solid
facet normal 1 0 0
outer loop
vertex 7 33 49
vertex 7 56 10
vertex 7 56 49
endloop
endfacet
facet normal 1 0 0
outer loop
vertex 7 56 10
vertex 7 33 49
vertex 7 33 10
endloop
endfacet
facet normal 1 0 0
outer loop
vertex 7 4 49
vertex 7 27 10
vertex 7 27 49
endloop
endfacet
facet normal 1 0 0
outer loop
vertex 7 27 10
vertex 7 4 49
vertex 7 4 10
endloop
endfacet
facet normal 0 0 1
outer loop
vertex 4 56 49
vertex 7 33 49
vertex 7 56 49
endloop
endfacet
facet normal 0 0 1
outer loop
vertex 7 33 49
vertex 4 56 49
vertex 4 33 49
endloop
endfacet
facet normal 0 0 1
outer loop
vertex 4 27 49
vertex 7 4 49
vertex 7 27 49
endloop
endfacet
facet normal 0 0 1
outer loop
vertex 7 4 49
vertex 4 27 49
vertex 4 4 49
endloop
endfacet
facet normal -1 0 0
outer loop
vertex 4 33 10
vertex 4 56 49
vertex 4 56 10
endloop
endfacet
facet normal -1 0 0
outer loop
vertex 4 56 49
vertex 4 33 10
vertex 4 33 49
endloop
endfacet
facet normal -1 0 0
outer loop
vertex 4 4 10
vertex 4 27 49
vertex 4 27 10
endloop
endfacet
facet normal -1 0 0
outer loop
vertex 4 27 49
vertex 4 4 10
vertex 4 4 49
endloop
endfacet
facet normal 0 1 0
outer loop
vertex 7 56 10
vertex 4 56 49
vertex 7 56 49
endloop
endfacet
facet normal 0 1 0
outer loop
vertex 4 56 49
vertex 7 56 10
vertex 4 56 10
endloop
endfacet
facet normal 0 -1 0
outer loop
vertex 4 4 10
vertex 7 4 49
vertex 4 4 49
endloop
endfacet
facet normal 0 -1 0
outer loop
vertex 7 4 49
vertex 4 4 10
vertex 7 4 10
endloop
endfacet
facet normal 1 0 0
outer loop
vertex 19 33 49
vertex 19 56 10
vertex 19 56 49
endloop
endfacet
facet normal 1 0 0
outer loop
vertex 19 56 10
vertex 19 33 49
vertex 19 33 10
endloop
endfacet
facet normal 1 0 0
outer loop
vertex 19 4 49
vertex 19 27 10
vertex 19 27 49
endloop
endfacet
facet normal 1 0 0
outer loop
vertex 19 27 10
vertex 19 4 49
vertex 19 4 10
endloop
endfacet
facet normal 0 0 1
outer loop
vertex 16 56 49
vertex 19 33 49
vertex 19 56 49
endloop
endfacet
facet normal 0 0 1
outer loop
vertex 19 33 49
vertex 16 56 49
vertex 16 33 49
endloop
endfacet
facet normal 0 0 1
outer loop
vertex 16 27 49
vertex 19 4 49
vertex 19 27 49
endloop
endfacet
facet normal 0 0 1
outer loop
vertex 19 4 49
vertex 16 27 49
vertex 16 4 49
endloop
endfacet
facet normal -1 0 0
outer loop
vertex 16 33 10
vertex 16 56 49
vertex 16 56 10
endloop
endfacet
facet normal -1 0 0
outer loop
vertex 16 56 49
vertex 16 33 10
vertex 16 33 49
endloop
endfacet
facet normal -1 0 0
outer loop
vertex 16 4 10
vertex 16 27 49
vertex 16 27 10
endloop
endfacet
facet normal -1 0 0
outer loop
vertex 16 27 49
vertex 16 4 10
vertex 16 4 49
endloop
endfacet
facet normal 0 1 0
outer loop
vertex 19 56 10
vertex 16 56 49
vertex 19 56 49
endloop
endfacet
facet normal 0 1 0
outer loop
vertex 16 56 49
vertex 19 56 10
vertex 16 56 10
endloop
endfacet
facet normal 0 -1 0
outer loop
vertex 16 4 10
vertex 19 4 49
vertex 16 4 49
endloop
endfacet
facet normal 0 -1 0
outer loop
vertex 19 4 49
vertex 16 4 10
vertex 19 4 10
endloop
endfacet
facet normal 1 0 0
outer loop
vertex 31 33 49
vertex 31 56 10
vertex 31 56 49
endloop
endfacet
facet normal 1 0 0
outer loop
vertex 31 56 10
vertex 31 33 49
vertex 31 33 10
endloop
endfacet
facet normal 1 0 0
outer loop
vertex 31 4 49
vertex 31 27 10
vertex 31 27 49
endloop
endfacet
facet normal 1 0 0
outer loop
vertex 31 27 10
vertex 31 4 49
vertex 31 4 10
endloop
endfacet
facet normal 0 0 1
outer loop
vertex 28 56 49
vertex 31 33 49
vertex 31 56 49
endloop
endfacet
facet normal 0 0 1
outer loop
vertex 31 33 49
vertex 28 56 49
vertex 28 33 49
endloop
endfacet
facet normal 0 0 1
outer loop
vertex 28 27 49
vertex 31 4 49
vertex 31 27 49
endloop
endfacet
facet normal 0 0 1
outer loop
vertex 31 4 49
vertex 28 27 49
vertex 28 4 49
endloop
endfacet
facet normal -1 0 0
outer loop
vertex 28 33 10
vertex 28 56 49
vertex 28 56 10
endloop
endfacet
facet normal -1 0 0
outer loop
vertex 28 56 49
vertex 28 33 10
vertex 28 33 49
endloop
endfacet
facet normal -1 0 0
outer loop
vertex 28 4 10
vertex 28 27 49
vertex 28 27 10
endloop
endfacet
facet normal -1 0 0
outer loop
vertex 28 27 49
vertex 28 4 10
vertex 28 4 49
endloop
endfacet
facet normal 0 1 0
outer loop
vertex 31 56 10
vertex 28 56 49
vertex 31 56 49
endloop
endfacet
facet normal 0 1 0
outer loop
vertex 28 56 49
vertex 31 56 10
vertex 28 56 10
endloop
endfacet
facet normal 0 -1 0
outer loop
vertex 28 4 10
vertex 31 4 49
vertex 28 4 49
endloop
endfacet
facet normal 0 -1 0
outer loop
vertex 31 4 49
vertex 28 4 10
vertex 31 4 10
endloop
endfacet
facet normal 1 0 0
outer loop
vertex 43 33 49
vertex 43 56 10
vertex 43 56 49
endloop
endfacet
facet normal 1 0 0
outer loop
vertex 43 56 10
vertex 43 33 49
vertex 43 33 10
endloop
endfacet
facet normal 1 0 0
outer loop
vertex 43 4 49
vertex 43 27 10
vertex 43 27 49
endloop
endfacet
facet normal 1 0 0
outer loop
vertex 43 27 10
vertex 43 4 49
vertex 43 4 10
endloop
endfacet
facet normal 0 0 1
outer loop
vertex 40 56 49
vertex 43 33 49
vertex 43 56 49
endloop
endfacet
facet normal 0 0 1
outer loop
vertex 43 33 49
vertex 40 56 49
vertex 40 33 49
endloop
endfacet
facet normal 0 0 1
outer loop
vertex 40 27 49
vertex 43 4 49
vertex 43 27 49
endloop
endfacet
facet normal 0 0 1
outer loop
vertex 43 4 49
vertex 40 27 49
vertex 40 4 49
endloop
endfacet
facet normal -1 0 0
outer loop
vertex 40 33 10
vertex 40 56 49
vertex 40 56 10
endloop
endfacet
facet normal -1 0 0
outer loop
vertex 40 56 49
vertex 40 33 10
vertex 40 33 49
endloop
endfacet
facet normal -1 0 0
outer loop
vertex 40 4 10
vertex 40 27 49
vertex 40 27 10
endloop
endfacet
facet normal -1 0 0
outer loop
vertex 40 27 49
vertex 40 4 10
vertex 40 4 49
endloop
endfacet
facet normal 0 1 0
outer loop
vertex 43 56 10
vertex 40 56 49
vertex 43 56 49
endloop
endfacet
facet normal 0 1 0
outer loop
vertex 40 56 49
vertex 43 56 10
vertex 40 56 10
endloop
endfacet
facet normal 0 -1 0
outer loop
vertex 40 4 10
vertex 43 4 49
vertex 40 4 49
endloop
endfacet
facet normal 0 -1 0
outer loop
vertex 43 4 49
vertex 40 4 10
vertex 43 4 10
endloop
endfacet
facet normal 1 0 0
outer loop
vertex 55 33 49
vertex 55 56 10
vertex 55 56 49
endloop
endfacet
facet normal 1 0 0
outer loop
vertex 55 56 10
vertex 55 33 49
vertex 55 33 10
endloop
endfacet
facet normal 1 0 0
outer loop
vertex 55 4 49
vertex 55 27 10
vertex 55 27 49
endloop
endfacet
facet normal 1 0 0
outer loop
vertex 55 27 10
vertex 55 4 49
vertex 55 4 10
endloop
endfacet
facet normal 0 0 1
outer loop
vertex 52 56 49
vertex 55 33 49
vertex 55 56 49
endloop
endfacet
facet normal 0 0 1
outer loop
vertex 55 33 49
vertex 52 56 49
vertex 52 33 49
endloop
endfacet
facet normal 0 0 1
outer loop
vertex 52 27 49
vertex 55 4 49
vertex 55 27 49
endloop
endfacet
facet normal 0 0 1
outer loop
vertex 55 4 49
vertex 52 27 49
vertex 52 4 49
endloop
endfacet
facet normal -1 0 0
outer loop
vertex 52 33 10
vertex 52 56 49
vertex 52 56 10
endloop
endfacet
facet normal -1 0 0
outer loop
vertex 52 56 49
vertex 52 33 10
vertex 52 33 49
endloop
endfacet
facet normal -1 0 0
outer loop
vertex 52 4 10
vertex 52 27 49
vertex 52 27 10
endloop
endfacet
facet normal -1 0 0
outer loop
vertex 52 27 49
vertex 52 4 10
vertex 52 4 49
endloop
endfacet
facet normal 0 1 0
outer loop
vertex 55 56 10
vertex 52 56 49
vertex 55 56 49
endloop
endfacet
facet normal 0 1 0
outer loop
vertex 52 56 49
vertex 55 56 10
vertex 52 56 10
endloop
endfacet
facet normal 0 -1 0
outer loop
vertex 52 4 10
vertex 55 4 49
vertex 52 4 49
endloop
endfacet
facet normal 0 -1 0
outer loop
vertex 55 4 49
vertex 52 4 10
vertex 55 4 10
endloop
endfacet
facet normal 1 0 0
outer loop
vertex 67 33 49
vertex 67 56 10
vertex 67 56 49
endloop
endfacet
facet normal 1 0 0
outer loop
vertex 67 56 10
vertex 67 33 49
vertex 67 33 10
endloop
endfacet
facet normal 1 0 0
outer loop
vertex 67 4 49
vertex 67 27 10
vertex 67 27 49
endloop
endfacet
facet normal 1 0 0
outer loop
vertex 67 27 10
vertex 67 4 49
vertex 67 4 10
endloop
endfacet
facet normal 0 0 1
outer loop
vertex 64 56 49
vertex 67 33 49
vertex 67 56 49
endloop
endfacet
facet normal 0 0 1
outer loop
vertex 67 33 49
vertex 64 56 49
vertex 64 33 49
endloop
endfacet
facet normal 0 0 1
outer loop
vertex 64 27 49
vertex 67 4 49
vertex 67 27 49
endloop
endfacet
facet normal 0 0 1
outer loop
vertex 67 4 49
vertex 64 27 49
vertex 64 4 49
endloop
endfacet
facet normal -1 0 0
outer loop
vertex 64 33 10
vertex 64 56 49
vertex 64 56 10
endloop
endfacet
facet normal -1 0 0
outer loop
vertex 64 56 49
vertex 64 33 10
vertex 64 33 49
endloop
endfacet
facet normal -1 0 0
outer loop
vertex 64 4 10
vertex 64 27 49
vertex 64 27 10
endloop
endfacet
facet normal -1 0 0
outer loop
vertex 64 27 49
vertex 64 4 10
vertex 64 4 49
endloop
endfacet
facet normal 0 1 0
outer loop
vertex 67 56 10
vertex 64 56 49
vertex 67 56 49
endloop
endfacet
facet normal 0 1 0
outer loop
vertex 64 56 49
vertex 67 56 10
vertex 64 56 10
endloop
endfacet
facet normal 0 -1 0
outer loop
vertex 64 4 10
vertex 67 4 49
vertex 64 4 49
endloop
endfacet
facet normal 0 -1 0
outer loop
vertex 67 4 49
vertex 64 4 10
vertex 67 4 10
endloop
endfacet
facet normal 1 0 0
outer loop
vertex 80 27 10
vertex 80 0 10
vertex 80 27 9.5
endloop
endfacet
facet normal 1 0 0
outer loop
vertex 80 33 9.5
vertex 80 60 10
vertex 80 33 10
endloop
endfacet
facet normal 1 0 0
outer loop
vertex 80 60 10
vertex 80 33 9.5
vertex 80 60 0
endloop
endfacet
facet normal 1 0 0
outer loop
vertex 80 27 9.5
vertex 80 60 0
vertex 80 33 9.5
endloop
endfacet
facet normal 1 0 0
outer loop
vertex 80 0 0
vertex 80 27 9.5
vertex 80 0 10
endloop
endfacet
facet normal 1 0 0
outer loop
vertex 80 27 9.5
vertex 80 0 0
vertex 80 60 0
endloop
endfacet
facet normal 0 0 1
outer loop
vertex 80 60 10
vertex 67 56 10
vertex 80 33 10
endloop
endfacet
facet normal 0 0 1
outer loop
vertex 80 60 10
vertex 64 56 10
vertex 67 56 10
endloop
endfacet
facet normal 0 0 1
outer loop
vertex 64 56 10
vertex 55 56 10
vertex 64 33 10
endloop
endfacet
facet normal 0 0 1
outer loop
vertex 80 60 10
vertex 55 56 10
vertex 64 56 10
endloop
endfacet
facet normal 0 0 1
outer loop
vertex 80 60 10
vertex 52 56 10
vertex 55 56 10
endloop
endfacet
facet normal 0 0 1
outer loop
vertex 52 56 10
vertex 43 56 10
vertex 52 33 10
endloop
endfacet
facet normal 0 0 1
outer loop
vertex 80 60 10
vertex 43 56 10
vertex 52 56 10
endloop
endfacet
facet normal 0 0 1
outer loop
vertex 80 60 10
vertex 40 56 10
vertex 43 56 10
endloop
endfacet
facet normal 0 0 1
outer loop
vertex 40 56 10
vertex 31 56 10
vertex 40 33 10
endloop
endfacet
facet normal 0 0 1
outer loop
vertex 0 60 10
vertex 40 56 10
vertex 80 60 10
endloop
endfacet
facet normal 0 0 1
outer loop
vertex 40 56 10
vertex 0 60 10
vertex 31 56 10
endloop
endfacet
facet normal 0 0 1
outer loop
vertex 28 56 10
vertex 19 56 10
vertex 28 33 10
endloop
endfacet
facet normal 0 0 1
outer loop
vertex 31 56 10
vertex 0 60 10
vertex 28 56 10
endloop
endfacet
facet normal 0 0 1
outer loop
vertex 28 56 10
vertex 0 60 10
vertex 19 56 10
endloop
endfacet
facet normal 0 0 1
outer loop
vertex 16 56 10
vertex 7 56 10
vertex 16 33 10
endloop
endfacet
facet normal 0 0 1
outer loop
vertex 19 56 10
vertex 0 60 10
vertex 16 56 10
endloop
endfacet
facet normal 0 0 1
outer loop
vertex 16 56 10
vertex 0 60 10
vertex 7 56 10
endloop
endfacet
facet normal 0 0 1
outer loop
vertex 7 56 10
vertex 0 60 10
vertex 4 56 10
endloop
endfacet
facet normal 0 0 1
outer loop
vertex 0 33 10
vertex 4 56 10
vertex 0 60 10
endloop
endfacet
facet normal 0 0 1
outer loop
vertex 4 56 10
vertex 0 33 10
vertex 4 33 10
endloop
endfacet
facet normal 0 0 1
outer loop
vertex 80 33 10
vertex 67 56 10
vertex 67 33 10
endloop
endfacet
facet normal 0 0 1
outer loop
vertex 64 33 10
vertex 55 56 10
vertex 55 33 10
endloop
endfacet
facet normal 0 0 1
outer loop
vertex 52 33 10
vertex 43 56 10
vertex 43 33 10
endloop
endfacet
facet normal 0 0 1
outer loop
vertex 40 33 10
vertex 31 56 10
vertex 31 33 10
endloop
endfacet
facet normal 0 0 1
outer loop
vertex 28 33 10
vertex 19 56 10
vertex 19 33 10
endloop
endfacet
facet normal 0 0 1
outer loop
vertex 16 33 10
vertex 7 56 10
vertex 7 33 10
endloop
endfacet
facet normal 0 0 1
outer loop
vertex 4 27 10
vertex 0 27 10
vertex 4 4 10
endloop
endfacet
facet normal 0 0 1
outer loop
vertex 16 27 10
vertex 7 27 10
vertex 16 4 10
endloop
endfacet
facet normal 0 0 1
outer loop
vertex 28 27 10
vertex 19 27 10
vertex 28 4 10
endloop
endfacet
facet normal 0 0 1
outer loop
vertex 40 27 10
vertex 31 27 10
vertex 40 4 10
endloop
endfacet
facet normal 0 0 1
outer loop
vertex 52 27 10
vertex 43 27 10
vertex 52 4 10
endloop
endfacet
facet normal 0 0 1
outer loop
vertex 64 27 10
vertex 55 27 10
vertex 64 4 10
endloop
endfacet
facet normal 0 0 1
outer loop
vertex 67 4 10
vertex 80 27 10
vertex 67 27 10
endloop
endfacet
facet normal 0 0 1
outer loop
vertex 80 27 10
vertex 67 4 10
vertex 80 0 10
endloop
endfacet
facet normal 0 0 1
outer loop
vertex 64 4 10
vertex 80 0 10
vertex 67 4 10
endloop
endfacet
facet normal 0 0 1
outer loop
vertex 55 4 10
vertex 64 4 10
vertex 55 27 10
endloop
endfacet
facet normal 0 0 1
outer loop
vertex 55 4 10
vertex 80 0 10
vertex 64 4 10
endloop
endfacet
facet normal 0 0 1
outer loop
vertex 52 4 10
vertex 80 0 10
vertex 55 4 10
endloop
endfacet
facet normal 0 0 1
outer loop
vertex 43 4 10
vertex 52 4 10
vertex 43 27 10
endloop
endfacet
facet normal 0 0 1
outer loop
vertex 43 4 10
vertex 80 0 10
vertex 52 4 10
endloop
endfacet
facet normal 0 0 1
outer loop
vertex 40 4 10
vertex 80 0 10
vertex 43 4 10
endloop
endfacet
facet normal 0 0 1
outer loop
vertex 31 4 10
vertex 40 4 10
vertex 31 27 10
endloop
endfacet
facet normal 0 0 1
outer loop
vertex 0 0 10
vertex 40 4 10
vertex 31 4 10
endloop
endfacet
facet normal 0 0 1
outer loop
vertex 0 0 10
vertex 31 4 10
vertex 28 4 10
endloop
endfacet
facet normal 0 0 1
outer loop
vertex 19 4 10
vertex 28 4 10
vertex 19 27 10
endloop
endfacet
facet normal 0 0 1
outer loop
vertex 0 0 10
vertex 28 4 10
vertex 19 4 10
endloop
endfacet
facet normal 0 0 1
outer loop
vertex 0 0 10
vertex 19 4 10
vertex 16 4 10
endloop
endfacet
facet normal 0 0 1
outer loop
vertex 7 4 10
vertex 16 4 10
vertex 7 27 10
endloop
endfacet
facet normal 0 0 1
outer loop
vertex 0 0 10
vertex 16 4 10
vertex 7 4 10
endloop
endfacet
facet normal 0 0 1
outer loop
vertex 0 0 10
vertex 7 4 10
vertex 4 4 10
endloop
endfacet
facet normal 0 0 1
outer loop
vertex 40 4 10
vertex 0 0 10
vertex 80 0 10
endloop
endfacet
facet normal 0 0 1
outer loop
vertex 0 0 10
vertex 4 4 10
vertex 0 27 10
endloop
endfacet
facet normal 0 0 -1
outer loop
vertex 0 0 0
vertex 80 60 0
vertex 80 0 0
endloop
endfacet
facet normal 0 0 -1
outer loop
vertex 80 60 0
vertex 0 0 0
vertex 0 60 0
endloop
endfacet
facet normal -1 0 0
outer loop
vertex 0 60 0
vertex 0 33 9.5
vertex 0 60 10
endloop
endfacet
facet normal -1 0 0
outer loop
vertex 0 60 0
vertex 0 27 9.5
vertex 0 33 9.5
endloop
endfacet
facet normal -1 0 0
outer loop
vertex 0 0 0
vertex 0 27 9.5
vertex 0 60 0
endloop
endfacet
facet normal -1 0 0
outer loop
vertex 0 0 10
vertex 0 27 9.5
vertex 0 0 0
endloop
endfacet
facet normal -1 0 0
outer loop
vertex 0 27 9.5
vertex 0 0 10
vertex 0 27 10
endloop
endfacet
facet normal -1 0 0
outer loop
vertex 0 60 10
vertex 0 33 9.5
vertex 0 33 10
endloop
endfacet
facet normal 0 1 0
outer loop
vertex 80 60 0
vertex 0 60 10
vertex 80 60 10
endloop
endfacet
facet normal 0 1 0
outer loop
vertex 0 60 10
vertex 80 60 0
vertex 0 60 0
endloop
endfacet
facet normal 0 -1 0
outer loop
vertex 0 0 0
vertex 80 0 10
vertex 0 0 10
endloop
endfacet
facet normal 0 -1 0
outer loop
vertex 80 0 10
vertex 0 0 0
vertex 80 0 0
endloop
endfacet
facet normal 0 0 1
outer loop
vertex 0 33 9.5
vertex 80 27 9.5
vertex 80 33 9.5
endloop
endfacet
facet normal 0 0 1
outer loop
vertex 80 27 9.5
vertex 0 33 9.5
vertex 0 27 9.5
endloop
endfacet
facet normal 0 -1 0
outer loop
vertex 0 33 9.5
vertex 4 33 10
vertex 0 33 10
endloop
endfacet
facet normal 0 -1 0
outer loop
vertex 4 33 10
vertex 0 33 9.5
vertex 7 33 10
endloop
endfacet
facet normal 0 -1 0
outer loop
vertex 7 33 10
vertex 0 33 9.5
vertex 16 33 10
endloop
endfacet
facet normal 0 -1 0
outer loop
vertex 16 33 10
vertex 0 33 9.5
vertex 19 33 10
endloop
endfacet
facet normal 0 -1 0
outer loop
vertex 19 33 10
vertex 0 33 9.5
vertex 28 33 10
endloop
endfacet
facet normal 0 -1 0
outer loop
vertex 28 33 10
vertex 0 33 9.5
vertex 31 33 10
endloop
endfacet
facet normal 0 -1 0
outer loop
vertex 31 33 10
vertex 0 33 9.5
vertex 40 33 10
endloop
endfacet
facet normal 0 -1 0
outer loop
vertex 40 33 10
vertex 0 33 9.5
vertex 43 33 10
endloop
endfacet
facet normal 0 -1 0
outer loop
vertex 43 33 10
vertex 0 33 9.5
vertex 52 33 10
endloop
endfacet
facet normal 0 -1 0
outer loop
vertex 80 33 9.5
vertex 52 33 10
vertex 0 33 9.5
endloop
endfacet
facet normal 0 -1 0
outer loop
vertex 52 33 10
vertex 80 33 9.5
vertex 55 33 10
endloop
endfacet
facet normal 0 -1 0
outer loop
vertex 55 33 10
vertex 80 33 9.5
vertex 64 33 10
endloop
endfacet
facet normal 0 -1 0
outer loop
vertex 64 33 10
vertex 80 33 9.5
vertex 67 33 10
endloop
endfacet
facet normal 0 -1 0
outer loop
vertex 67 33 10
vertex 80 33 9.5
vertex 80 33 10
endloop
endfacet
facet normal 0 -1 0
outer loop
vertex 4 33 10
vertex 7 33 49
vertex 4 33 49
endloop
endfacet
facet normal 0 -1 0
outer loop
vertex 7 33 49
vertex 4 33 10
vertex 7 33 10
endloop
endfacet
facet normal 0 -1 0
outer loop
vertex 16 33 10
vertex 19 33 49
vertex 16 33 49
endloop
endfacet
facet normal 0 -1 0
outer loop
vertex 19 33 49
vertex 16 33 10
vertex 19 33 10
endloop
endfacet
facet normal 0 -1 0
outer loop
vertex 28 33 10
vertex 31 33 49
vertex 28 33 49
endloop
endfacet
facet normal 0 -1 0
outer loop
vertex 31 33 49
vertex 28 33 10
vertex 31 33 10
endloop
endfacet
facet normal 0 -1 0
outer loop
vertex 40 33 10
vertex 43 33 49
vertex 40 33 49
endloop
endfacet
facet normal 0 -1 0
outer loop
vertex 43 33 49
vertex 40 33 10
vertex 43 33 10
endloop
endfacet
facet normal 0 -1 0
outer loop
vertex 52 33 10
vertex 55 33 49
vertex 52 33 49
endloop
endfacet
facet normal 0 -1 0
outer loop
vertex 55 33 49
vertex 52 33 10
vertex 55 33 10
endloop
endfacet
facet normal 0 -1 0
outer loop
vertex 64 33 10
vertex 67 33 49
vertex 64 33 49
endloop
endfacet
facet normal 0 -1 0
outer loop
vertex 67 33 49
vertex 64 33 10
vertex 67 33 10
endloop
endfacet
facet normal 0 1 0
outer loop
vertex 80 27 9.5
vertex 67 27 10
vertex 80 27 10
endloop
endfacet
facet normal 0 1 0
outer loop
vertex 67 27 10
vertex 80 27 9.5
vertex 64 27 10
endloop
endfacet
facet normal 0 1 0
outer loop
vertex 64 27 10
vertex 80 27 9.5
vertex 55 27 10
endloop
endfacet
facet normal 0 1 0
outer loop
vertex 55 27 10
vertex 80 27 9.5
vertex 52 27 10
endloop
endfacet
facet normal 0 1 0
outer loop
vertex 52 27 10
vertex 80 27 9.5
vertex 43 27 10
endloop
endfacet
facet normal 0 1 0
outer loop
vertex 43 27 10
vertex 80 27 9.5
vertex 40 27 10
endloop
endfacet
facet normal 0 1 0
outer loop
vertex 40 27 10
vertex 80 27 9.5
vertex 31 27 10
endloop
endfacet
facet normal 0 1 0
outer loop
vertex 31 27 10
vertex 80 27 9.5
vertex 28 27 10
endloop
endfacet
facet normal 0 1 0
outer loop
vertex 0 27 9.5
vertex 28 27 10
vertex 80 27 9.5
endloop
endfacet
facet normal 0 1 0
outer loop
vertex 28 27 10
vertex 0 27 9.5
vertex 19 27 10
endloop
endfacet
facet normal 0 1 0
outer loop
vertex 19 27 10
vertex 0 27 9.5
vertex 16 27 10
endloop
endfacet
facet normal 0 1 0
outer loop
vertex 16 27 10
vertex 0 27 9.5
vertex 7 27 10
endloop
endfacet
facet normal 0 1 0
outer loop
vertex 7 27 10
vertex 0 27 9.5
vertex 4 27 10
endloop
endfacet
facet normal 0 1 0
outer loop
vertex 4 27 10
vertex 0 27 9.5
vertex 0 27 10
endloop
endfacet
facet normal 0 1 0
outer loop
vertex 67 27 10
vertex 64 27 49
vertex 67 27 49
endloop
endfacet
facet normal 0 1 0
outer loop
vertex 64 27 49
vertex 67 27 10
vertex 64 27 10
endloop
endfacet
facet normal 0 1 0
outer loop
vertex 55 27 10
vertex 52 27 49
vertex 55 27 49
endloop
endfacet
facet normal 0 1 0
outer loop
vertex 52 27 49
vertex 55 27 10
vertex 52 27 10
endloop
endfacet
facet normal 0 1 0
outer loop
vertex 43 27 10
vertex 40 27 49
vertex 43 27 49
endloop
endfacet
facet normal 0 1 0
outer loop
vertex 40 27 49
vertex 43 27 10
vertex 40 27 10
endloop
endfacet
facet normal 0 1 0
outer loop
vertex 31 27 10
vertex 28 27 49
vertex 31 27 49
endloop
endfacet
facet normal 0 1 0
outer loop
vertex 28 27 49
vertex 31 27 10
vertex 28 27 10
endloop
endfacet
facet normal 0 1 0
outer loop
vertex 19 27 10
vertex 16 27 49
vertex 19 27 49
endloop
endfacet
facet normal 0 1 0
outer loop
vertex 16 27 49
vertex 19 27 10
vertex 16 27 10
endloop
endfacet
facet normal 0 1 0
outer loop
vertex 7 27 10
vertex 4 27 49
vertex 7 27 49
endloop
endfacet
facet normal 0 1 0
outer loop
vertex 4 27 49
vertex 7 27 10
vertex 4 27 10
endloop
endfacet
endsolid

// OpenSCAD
$fn = 32;

// ----------------------------------------------------------------------
// Heatsink: slotted fin block
// ----------------------------------------------------------------------

// --- parameters (mm) ---
base_l = 80;              // base length, X
base_w = 60;              // base width, Y
base_t = 10;              // base plate thickness
fin_h = 40;               // fin height above the base
fin_t = 3;                // fin thickness
edge = 4;                 // margin from the base ends
pitch = 12;               // fin pitch
slot_w = 6;               // central slot width, Y

n_fins = floor((base_l - 2 * edge - fin_t) / pitch) + 1;  // fin count
total_h = base_t + fin_h - 1;  // overall height

difference() {
union() {
  cube([base_l, base_w, base_t]);
  for (i = [0 : n_fins - 1])
    translate([edge + i * pitch, edge, base_t - 1])
      cube([fin_t, base_w - 2 * edge, fin_h]);
}
  translate([-1, base_w / 2 - slot_w / 2, base_t - 0.5])
    cube([base_l + 2, slot_w, fin_h + 2]);
}
